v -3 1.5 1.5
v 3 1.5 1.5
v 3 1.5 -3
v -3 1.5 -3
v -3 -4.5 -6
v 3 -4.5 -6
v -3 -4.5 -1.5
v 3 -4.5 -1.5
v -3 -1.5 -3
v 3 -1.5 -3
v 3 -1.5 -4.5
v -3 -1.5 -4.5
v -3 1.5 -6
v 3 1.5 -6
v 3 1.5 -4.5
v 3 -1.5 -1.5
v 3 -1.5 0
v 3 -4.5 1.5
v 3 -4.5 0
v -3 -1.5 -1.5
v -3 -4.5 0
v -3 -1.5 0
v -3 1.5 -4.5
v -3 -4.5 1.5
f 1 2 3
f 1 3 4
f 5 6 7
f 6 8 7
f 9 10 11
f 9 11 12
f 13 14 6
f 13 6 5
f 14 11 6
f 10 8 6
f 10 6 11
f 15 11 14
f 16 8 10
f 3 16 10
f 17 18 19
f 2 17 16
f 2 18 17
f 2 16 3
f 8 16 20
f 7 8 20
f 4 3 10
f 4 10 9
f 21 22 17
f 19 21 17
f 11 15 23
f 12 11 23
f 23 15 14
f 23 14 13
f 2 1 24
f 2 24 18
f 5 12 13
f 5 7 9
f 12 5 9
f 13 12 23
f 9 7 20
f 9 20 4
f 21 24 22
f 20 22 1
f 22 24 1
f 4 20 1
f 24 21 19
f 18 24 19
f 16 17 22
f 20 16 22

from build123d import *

# Parameters (mm, degrees)
SKETCH1_W           = 6
SKETCH1_H           = 6
BOSS_EXTRUDE1_DEPTH = 1.5
SKETCH2_W           = 6
SKETCH2_H           = 3
BOSS_EXTRUDE2_DEPTH = 1.5
SKETCH3_W           = 6
SKETCH3_H           = 6
BOSS_EXTRUDE4_DEPTH = 1.5
SKETCH4_W           = 6
SKETCH4_H           = 3
BOSS_EXTRUDE5_DEPTH = 1.5
SKETCH5_W           = 6
SKETCH5_H           = 6
BOSS_EXTRUDE6_DEPTH = 1.5


with BuildPart() as part:
    # Sketch1 → Boss-Extrude1 (new body)
    with BuildSketch(Plane.XY):
        with Locations((0, -1.5)):
            Rectangle(SKETCH1_W, SKETCH1_H)
    extrude(amount=BOSS_EXTRUDE1_DEPTH)

    # Sketch2 → Boss-Extrude2 (add)
    with BuildSketch(Plane(origin=(0, 0, 0), x_dir=(-1, 0, 0), z_dir=(0, 0, -1))):
        Rectangle(SKETCH2_W, SKETCH2_H)
    extrude(amount=BOSS_EXTRUDE2_DEPTH)

    # Sketch3 → Boss-Extrude4 (add)
    with BuildSketch(Plane(origin=(0, 0, -1.5), x_dir=(-1, 0, 0), z_dir=(0, 0, -1))):
        with Locations((0, -1.5)):
            Rectangle(SKETCH3_W, SKETCH3_H)
    extrude(amount=BOSS_EXTRUDE4_DEPTH)

    # Sketch4 → Boss-Extrude5 (add)
    with BuildSketch(Plane(origin=(0, 0, -3), x_dir=(-1, 0, 0), z_dir=(0, 0, -1))):
        with Locations((0, -3)):
            Rectangle(SKETCH4_W, SKETCH4_H)
    extrude(amount=BOSS_EXTRUDE5_DEPTH)

    # Sketch5 → Boss-Extrude6 (add)
    with BuildSketch(Plane(origin=(0, 0, -4.5), x_dir=(-1, 0, 0), z_dir=(0, 0, -1))):
        with Locations((0, -1.5)):
            Rectangle(SKETCH5_W, SKETCH5_H)
    extrude(amount=BOSS_EXTRUDE6_DEPTH)


solid = part.part
